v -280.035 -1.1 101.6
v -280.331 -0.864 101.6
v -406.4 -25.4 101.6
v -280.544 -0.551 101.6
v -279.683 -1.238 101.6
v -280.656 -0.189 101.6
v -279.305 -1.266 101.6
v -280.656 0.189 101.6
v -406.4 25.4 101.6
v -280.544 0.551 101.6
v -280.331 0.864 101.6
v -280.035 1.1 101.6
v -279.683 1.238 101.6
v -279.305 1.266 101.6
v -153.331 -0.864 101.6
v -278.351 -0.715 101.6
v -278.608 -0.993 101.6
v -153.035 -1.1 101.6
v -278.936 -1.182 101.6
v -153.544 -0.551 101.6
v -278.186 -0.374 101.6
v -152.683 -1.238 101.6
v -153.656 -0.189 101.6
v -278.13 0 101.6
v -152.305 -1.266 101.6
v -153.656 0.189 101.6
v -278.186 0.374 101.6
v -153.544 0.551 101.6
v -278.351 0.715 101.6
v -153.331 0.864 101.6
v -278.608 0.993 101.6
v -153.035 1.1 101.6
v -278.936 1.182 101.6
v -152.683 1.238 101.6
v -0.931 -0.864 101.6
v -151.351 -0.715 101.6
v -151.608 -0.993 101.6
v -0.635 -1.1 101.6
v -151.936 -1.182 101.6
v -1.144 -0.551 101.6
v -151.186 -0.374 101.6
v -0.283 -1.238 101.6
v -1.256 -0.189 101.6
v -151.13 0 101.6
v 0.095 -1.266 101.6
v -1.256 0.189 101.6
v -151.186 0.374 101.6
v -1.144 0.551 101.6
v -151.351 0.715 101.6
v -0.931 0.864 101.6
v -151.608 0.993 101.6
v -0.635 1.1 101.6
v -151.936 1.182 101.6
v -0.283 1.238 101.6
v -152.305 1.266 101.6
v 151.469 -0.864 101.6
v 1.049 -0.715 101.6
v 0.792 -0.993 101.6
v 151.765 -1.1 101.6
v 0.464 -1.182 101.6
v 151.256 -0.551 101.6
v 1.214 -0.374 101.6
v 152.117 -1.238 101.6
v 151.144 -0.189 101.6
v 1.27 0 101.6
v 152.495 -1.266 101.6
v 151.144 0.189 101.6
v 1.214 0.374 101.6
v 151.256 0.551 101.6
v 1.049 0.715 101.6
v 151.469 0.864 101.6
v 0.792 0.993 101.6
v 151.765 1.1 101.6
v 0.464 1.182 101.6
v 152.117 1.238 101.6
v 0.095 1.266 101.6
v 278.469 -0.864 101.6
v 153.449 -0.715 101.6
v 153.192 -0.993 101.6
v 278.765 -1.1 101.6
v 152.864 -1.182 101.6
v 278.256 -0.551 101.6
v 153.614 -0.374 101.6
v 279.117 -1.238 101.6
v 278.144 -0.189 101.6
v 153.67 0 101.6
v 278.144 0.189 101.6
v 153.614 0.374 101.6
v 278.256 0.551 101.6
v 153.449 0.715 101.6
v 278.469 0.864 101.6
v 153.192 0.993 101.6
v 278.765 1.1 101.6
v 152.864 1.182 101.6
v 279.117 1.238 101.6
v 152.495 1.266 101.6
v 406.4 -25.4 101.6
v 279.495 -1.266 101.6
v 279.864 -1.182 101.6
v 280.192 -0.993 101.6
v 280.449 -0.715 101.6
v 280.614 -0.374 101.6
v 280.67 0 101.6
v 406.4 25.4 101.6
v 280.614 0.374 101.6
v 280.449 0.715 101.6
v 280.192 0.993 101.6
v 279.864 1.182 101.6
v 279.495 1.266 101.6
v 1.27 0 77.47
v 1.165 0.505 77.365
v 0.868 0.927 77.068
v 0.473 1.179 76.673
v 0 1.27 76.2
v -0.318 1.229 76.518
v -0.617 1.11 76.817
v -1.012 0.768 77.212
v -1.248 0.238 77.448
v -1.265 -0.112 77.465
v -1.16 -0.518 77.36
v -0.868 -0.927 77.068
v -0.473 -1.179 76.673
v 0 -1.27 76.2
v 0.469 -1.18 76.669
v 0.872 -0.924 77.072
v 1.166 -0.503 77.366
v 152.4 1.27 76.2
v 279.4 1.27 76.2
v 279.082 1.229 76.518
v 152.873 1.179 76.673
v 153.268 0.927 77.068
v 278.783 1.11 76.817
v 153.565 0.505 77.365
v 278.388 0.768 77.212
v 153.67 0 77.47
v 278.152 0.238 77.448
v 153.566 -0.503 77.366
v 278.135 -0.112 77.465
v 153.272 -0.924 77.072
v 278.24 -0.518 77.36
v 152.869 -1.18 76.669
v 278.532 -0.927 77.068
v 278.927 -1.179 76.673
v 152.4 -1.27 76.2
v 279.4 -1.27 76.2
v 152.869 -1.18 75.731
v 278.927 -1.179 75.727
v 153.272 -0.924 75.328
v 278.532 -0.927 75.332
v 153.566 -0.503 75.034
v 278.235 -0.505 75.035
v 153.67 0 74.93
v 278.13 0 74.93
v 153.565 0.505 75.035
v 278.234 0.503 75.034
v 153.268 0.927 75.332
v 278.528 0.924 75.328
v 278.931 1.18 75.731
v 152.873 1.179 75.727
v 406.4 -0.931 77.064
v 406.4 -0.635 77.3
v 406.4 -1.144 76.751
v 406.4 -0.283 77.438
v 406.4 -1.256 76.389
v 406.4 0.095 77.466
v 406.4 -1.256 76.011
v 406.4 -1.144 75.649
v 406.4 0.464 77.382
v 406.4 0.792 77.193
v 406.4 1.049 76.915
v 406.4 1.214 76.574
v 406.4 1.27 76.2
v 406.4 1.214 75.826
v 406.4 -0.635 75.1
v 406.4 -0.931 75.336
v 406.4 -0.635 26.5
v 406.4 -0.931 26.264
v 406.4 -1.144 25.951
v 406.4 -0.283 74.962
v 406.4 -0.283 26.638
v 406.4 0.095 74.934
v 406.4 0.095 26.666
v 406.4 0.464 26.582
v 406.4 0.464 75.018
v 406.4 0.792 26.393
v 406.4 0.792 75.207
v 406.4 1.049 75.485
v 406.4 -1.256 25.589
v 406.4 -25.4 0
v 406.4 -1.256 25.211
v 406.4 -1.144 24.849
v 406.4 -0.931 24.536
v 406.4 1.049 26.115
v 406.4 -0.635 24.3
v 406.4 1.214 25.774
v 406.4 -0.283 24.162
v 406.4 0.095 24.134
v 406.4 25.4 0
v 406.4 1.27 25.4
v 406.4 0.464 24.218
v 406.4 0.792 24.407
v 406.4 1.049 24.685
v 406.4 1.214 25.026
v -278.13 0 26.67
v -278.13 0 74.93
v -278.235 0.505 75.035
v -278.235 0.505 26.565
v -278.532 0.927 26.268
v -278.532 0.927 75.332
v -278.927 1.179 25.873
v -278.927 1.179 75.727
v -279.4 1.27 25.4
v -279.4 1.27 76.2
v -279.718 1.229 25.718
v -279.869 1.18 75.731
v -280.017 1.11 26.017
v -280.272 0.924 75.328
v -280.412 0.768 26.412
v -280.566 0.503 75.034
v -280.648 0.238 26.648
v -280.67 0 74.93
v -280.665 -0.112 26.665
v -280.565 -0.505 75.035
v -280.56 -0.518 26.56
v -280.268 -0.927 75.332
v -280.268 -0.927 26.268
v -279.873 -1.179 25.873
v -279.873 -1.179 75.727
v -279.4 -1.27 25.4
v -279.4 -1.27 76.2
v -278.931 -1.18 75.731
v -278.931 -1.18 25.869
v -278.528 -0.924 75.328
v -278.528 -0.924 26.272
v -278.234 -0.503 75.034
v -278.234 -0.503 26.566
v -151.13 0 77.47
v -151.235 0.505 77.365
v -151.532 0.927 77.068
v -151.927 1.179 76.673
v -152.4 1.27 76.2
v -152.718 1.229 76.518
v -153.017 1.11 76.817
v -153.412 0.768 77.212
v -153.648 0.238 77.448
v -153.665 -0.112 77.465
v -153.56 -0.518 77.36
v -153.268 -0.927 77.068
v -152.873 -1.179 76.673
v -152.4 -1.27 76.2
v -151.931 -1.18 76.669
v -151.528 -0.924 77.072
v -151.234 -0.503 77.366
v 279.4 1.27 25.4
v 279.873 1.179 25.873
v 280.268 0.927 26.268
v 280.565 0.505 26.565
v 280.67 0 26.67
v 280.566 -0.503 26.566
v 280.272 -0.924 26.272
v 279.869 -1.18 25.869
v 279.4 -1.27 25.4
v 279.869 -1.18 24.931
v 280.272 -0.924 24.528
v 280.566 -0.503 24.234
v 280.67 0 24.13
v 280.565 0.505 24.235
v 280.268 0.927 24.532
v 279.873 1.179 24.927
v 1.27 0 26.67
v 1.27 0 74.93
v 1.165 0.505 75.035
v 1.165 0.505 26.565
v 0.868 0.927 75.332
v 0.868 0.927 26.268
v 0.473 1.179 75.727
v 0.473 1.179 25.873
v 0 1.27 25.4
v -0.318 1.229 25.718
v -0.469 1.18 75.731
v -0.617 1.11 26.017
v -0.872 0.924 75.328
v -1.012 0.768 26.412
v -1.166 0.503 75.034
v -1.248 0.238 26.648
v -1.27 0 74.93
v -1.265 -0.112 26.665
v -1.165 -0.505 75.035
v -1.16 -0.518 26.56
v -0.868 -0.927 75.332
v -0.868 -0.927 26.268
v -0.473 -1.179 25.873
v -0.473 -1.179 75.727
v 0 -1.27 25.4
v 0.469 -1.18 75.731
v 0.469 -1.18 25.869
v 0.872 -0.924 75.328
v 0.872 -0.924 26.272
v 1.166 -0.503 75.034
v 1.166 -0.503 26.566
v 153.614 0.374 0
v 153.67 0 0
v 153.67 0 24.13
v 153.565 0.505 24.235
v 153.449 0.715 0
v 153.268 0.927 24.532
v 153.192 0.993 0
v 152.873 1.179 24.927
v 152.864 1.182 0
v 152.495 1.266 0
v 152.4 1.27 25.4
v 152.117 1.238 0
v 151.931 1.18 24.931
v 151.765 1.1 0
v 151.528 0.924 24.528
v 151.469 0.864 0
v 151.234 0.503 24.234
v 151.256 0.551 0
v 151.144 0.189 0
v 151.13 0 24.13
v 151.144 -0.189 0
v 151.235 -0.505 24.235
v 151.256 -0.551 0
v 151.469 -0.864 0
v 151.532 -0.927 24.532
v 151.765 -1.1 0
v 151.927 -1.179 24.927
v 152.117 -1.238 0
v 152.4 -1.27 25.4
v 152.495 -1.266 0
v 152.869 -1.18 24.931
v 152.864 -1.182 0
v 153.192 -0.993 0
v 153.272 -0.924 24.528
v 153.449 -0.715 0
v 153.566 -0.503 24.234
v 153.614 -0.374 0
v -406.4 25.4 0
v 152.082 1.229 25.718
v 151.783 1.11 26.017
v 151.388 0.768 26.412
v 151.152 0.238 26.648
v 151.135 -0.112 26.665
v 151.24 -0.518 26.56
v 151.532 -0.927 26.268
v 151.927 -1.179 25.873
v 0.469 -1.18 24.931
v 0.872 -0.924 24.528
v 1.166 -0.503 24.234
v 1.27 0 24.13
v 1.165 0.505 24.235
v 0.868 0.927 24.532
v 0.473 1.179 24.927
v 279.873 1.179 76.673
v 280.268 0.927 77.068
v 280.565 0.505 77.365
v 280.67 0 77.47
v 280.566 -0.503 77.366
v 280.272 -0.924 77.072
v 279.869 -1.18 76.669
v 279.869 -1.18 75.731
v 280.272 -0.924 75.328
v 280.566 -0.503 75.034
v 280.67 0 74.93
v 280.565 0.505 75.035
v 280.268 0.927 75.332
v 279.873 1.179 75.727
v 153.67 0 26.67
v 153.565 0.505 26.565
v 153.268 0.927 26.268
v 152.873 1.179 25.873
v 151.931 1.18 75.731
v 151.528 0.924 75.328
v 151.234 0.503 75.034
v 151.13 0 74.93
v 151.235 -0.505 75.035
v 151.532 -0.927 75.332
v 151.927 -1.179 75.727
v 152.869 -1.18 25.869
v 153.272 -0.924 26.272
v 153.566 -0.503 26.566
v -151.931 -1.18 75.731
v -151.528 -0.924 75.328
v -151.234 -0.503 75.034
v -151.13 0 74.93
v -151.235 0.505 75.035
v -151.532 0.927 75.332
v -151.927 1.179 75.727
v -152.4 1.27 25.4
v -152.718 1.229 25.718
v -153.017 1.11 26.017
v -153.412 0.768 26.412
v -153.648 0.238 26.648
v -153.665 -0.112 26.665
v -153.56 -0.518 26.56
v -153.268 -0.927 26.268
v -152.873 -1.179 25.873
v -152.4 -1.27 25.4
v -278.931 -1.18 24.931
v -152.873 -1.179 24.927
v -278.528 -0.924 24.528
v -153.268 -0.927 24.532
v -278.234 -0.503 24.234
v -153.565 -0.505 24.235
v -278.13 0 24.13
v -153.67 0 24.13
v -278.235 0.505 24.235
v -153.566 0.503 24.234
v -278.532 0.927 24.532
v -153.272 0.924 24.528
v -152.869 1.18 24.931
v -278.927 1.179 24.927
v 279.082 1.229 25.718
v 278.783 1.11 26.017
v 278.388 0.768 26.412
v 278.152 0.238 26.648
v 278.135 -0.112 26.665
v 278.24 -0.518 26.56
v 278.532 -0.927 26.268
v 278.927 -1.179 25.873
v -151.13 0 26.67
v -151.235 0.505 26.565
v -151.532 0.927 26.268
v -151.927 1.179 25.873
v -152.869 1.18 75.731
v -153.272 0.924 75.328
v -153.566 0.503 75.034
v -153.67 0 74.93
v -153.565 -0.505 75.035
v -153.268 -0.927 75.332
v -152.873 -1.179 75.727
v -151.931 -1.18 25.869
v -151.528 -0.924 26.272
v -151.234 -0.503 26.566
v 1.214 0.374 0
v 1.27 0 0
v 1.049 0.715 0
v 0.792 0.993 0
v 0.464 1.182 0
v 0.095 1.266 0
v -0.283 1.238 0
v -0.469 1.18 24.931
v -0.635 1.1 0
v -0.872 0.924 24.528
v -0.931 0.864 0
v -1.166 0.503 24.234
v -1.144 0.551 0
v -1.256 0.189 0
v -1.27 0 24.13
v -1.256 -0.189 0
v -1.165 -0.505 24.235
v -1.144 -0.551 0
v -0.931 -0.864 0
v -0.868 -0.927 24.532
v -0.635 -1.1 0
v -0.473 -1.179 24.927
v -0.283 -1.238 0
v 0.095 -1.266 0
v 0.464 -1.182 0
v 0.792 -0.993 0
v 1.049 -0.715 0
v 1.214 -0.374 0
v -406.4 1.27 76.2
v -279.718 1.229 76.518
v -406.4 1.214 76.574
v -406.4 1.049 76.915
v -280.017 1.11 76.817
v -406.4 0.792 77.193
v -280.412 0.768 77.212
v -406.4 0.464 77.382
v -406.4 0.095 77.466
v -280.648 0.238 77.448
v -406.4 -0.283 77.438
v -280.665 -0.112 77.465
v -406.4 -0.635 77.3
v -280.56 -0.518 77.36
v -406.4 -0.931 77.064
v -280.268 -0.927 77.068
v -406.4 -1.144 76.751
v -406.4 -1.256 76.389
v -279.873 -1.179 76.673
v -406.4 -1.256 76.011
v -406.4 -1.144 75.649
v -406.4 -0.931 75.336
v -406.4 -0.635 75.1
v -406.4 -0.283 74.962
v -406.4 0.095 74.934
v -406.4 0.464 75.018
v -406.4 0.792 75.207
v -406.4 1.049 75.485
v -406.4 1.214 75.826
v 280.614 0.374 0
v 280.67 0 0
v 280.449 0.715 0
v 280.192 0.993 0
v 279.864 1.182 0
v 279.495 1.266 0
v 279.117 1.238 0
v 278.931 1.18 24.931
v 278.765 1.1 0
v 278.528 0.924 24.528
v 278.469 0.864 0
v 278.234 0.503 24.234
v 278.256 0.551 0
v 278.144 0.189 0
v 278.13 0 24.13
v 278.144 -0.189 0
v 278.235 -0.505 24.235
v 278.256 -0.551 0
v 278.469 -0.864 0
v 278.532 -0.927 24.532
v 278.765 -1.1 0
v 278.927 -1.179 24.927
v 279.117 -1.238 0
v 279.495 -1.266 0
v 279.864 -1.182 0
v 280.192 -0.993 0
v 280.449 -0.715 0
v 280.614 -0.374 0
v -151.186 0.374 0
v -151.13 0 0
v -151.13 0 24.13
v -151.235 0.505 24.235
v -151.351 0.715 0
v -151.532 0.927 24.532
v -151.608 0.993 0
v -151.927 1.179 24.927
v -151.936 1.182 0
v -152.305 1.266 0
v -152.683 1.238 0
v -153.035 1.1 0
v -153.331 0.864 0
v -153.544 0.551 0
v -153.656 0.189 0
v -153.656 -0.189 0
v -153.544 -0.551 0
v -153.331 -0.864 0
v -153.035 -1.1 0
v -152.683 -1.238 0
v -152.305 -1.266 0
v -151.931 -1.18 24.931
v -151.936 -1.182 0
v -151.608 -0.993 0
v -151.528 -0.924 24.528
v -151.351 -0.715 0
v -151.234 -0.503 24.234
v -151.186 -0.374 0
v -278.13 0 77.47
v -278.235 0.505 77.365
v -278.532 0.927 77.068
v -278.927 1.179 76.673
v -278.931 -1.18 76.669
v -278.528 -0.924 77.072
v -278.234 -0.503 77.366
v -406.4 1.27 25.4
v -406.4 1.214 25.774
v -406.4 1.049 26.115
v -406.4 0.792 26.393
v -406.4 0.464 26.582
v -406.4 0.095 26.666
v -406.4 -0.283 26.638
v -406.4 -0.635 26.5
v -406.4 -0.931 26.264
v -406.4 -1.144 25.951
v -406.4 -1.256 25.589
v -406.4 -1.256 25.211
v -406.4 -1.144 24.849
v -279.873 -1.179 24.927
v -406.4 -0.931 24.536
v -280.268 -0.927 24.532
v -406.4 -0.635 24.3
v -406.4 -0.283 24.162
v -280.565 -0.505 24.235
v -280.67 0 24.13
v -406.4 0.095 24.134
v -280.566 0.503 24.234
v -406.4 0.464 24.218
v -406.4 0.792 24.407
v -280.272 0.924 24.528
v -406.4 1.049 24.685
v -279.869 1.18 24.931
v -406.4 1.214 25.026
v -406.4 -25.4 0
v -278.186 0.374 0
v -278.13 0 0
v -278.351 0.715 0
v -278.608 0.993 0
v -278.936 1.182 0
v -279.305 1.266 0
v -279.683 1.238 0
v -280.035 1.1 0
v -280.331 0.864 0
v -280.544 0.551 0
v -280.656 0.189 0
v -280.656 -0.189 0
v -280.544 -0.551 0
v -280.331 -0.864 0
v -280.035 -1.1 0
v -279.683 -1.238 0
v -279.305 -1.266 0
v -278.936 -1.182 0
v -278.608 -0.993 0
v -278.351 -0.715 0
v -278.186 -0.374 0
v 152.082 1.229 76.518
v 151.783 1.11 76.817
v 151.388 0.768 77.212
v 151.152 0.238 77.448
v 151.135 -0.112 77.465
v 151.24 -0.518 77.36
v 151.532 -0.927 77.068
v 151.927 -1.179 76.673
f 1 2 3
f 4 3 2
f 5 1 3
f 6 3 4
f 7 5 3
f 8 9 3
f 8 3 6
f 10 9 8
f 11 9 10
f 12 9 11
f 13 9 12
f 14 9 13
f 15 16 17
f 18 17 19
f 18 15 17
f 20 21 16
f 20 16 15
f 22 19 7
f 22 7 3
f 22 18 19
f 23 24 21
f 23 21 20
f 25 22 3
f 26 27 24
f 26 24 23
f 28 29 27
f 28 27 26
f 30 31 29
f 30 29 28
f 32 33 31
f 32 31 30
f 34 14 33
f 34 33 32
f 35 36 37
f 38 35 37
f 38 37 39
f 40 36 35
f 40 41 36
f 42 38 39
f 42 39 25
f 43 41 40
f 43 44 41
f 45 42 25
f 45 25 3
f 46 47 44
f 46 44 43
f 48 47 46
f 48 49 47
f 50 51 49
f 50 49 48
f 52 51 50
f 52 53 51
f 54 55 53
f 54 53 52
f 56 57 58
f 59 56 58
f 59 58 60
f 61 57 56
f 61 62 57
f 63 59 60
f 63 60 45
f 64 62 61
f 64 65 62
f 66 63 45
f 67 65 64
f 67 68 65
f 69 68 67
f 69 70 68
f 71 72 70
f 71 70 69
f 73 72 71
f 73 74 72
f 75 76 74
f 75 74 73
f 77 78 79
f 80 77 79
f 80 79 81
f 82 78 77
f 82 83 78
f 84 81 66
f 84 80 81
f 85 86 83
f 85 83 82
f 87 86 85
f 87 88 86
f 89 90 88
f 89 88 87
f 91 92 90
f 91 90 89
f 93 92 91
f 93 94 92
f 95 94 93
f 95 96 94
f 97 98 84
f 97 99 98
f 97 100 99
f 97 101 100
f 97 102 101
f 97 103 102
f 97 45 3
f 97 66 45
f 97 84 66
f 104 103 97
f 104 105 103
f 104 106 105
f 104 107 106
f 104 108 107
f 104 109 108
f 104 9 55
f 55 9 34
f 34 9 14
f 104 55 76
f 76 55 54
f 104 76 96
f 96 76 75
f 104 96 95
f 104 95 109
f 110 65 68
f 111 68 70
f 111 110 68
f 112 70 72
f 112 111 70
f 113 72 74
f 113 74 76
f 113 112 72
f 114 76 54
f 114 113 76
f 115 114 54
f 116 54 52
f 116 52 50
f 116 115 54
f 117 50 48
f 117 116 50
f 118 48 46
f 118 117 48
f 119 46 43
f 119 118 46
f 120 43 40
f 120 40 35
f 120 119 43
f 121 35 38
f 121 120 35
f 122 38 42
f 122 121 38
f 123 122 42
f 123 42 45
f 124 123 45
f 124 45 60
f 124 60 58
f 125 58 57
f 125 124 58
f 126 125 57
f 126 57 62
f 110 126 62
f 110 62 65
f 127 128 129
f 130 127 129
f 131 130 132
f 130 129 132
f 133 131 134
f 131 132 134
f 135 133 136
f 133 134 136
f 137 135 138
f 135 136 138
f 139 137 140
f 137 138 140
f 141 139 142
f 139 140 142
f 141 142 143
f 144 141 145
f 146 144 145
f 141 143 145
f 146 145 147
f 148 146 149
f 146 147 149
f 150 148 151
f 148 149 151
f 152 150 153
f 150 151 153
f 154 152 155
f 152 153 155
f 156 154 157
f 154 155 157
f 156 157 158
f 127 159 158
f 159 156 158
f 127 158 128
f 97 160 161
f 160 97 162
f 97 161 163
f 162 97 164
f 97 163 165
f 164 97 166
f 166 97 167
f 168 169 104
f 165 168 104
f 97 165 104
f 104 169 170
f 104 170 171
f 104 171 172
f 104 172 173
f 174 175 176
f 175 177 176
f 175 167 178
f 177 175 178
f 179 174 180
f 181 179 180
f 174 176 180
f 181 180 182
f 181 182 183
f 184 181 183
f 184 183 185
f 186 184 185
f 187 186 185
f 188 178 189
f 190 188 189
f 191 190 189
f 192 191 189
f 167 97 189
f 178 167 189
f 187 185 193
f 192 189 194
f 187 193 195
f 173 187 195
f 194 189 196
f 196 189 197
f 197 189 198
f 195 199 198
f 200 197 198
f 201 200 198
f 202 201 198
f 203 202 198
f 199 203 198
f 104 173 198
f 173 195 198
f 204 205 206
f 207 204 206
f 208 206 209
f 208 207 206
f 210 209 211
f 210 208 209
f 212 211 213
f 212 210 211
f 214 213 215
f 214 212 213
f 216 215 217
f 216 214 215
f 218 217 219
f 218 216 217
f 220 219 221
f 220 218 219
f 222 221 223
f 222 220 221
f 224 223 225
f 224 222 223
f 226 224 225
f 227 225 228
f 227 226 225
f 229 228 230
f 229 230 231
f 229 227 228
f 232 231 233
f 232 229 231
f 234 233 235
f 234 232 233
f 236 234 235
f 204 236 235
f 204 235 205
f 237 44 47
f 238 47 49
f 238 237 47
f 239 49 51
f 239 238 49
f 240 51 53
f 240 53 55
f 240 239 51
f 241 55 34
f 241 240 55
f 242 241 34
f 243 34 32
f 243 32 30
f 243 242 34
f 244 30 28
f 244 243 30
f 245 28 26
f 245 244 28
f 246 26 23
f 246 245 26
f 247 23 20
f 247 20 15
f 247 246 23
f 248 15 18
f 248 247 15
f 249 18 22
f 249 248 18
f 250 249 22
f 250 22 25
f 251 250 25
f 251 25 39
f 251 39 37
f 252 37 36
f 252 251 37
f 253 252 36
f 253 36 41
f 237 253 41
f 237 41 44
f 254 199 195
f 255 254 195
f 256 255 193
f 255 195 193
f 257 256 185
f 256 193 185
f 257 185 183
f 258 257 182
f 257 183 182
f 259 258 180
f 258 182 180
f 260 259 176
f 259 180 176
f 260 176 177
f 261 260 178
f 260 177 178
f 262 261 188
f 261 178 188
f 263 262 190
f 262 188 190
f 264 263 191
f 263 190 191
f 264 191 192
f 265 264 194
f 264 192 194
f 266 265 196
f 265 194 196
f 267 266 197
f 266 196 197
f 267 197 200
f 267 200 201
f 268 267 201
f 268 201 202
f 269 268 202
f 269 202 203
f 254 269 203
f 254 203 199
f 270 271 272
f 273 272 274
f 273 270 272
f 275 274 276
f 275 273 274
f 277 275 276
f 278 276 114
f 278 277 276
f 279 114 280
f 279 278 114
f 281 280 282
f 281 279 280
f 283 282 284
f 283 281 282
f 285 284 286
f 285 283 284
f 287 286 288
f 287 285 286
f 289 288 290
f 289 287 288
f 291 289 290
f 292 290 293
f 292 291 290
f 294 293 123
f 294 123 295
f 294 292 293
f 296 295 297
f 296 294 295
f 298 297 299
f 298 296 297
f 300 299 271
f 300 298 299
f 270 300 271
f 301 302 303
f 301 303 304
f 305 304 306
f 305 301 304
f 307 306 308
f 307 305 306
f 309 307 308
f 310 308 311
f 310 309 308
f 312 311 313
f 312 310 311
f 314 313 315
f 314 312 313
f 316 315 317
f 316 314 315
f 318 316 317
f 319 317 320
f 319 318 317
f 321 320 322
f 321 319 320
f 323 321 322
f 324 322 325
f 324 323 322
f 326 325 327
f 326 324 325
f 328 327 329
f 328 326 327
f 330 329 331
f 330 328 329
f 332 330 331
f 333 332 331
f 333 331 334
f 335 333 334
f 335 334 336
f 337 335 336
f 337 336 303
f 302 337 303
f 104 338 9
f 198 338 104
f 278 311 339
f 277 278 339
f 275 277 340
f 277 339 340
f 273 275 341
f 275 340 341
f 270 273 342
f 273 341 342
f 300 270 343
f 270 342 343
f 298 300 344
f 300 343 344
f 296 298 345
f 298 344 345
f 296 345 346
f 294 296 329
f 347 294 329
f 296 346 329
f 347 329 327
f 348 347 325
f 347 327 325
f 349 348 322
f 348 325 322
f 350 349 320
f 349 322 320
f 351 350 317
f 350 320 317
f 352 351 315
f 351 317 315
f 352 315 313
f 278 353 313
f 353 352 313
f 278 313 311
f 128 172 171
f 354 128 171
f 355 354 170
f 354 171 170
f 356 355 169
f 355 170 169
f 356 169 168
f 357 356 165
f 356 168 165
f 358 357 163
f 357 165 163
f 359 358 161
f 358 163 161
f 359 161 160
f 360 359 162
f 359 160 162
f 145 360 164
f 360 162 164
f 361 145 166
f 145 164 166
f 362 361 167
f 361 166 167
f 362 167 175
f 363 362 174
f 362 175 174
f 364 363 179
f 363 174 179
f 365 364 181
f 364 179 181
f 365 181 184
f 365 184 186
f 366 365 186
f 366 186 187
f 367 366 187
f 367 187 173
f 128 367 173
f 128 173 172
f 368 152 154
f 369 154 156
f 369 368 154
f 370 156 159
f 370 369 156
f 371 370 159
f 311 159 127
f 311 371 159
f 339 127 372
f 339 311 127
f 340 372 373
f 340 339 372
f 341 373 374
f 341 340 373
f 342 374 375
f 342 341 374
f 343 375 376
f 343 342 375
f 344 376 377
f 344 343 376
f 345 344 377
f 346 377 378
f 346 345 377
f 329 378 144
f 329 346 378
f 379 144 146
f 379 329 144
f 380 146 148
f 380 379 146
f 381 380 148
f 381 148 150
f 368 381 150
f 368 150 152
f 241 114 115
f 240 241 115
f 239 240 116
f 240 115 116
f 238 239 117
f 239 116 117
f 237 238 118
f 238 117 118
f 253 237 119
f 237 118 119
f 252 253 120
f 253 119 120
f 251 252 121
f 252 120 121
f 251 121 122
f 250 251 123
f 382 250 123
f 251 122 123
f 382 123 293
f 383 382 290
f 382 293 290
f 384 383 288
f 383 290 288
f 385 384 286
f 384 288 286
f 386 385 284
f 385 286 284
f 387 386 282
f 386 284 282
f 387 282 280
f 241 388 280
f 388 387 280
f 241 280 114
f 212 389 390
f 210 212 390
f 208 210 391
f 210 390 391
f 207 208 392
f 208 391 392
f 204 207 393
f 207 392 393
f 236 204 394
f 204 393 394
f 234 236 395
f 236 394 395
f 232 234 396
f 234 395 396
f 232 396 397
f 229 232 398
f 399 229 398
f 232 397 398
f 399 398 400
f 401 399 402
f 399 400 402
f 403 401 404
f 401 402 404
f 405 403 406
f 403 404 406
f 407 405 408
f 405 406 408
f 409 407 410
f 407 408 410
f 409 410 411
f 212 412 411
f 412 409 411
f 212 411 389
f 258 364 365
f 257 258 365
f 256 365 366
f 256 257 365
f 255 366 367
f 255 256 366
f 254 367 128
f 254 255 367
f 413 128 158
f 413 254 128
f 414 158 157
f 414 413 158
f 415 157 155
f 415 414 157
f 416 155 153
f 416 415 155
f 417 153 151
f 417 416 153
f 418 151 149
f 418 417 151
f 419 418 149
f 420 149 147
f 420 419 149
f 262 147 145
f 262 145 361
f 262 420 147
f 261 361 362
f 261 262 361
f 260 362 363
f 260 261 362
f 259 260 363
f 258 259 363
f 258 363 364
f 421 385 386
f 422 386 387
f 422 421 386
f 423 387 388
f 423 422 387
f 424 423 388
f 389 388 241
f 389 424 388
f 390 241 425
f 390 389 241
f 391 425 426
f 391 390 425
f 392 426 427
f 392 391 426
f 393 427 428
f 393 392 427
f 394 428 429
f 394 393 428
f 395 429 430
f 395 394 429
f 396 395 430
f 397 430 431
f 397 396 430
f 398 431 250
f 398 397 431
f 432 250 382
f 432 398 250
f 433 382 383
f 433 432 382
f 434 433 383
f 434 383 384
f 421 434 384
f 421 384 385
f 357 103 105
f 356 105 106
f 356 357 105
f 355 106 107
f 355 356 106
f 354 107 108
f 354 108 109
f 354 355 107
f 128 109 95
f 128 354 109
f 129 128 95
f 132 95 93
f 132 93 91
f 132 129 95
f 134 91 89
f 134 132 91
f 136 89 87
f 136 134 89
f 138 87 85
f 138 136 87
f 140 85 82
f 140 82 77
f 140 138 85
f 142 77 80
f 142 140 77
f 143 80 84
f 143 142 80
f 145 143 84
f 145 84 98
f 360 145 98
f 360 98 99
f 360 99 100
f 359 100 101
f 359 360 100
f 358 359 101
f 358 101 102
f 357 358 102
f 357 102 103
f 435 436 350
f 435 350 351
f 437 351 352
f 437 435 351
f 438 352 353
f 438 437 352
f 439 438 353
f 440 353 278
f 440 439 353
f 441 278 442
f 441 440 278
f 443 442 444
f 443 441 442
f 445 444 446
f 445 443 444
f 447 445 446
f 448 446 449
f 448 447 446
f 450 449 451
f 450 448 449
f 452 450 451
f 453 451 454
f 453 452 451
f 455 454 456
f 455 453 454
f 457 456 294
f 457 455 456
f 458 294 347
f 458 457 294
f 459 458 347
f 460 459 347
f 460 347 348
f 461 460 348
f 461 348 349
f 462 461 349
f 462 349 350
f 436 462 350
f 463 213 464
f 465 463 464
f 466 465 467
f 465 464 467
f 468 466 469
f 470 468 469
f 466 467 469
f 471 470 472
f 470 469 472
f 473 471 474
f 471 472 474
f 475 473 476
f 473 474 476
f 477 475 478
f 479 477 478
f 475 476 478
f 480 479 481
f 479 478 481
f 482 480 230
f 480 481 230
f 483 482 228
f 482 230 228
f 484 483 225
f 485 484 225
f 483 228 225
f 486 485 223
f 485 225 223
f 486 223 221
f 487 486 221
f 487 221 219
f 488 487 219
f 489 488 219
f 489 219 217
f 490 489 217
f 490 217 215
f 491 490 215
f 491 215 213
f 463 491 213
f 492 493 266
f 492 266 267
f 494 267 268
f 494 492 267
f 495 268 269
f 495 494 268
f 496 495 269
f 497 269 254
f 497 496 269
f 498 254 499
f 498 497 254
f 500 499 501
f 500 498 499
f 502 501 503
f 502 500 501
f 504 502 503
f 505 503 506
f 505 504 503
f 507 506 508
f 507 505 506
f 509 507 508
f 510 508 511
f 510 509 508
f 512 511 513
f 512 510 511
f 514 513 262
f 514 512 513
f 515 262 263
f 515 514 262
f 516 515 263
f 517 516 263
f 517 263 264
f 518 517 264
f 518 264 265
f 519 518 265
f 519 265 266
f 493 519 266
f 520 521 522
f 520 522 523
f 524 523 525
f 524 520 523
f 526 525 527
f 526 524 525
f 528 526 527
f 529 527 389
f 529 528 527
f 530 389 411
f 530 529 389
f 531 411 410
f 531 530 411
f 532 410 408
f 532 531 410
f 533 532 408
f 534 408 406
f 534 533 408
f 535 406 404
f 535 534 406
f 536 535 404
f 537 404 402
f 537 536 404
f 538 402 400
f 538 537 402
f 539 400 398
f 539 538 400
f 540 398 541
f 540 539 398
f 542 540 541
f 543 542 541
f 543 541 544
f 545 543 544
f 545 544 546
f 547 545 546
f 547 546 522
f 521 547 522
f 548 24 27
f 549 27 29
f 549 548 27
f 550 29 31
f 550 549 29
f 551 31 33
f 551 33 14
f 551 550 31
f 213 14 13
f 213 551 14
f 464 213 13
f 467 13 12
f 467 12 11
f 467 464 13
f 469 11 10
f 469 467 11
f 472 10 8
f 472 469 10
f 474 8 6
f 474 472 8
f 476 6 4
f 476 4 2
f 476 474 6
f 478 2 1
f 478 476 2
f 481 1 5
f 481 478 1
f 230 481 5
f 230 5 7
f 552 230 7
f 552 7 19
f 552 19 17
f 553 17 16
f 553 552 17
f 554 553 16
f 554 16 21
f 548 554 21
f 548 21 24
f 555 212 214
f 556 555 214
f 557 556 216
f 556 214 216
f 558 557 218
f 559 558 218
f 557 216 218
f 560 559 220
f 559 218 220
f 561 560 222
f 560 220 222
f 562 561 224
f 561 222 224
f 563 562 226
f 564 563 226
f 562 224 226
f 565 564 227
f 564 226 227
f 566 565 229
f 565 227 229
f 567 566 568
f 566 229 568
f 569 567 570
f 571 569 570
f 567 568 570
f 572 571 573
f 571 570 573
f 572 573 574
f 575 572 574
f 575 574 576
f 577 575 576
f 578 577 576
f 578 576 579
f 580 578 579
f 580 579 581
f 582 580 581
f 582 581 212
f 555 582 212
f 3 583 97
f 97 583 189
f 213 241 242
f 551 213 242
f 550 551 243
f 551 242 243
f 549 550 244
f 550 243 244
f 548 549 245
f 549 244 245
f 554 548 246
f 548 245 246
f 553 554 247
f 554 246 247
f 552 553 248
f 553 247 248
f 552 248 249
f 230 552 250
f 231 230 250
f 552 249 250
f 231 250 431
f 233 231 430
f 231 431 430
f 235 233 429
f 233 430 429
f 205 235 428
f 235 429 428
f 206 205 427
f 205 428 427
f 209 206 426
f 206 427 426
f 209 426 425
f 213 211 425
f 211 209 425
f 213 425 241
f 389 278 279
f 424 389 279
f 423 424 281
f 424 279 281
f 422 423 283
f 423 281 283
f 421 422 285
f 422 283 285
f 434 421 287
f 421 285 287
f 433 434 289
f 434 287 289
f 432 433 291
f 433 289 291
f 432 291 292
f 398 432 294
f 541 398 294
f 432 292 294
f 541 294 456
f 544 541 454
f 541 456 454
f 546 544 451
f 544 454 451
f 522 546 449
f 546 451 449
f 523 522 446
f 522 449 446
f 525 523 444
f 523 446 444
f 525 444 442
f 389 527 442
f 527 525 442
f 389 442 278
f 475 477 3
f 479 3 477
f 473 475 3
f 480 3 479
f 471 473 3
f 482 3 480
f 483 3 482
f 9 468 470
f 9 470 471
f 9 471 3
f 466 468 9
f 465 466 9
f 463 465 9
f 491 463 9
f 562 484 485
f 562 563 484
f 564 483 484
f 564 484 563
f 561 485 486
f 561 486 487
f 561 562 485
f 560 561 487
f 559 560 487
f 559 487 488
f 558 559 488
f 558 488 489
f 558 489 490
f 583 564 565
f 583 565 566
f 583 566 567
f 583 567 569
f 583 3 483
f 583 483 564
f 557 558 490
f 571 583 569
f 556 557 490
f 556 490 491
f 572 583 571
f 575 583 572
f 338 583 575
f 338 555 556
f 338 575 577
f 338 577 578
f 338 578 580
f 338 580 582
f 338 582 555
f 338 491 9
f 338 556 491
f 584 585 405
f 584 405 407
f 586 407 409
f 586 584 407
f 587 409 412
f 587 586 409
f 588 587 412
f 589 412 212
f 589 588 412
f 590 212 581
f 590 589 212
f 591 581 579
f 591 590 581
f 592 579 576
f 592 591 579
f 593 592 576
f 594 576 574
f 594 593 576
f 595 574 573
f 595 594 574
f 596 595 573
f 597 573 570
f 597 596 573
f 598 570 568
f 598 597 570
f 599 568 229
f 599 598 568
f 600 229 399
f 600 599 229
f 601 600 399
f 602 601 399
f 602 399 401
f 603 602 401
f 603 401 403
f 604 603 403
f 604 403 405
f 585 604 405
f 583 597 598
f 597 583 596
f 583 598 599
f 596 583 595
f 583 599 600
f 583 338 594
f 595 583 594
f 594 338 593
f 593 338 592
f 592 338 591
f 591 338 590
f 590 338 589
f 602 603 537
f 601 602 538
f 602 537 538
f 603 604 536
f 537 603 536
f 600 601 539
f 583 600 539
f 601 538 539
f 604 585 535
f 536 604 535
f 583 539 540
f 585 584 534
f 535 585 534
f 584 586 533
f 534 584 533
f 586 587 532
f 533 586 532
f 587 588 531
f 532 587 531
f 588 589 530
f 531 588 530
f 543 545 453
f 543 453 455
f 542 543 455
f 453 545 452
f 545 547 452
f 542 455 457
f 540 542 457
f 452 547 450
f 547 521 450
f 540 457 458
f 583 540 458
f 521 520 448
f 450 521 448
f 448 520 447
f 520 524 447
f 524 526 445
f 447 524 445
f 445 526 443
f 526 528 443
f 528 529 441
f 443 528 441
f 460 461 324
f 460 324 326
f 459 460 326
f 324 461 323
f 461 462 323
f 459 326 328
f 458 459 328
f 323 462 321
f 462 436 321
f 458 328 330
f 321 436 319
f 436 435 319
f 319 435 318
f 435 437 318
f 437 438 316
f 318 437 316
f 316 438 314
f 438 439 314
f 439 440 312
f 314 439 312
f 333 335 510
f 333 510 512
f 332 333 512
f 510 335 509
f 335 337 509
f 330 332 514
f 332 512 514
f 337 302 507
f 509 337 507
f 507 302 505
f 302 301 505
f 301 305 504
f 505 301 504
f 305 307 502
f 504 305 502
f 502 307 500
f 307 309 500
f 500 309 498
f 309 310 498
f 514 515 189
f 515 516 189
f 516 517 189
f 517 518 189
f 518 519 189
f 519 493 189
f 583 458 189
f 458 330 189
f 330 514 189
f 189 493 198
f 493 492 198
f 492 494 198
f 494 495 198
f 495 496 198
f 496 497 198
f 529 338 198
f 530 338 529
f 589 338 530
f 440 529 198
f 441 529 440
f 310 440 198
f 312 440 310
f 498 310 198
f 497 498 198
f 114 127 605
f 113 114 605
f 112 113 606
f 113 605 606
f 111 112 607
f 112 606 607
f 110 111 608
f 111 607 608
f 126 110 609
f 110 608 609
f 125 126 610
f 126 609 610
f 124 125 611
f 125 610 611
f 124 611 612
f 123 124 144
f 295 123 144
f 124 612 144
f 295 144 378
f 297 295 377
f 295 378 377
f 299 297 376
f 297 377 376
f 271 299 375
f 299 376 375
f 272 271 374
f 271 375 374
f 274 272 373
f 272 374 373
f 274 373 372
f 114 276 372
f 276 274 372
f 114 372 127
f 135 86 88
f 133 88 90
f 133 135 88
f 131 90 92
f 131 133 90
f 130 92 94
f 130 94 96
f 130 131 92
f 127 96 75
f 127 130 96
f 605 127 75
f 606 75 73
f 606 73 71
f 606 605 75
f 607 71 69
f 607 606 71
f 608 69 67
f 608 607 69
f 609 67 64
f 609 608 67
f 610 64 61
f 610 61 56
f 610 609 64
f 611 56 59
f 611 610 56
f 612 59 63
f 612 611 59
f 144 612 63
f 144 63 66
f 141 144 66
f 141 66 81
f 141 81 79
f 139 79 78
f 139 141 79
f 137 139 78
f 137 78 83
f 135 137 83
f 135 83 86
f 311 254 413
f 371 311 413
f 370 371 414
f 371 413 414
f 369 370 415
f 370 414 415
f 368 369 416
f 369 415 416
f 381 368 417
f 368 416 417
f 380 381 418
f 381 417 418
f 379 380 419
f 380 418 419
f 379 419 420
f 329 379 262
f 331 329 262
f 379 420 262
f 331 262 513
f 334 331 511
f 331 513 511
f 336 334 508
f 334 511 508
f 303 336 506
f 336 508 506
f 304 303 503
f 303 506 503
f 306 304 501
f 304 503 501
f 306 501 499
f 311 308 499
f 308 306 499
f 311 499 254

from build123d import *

# Parameters (mm, degrees)
F0_W     = 812.8
F0_H     = 50.8
F0_R     = 1.27
F1_DEPTH = 101.6
F2_R     = 1.27
F3_DEPTH = 812.801


with BuildPart() as f1:
    # F0 (on Top) → F1 (new body)
    with BuildSketch(Plane.XY):
        Rectangle(F0_W, F0_H)
        with Locations((-279.4, 0)):
            Circle(F0_R, mode=Mode.SUBTRACT)
        with Locations((-152.4, 0)):
            Circle(F0_R, mode=Mode.SUBTRACT)
        Circle(F0_R, mode=Mode.SUBTRACT)
        with Locations((152.4, 0)):
            Circle(F0_R, mode=Mode.SUBTRACT)
        with Locations((279.4, 0)):
            Circle(F0_R, mode=Mode.SUBTRACT)
    extrude(amount=F1_DEPTH)

    # F2 (on face) → F3 (cut, through all)
    with BuildSketch(Plane.YZ.offset(406.4)):
        with Locations((0, 76.2)):
            Circle(F2_R)
        with Locations((0, 25.4)):
            Circle(F2_R)
    extrude(amount=-F3_DEPTH, mode=Mode.SUBTRACT)


solid = f1.part
